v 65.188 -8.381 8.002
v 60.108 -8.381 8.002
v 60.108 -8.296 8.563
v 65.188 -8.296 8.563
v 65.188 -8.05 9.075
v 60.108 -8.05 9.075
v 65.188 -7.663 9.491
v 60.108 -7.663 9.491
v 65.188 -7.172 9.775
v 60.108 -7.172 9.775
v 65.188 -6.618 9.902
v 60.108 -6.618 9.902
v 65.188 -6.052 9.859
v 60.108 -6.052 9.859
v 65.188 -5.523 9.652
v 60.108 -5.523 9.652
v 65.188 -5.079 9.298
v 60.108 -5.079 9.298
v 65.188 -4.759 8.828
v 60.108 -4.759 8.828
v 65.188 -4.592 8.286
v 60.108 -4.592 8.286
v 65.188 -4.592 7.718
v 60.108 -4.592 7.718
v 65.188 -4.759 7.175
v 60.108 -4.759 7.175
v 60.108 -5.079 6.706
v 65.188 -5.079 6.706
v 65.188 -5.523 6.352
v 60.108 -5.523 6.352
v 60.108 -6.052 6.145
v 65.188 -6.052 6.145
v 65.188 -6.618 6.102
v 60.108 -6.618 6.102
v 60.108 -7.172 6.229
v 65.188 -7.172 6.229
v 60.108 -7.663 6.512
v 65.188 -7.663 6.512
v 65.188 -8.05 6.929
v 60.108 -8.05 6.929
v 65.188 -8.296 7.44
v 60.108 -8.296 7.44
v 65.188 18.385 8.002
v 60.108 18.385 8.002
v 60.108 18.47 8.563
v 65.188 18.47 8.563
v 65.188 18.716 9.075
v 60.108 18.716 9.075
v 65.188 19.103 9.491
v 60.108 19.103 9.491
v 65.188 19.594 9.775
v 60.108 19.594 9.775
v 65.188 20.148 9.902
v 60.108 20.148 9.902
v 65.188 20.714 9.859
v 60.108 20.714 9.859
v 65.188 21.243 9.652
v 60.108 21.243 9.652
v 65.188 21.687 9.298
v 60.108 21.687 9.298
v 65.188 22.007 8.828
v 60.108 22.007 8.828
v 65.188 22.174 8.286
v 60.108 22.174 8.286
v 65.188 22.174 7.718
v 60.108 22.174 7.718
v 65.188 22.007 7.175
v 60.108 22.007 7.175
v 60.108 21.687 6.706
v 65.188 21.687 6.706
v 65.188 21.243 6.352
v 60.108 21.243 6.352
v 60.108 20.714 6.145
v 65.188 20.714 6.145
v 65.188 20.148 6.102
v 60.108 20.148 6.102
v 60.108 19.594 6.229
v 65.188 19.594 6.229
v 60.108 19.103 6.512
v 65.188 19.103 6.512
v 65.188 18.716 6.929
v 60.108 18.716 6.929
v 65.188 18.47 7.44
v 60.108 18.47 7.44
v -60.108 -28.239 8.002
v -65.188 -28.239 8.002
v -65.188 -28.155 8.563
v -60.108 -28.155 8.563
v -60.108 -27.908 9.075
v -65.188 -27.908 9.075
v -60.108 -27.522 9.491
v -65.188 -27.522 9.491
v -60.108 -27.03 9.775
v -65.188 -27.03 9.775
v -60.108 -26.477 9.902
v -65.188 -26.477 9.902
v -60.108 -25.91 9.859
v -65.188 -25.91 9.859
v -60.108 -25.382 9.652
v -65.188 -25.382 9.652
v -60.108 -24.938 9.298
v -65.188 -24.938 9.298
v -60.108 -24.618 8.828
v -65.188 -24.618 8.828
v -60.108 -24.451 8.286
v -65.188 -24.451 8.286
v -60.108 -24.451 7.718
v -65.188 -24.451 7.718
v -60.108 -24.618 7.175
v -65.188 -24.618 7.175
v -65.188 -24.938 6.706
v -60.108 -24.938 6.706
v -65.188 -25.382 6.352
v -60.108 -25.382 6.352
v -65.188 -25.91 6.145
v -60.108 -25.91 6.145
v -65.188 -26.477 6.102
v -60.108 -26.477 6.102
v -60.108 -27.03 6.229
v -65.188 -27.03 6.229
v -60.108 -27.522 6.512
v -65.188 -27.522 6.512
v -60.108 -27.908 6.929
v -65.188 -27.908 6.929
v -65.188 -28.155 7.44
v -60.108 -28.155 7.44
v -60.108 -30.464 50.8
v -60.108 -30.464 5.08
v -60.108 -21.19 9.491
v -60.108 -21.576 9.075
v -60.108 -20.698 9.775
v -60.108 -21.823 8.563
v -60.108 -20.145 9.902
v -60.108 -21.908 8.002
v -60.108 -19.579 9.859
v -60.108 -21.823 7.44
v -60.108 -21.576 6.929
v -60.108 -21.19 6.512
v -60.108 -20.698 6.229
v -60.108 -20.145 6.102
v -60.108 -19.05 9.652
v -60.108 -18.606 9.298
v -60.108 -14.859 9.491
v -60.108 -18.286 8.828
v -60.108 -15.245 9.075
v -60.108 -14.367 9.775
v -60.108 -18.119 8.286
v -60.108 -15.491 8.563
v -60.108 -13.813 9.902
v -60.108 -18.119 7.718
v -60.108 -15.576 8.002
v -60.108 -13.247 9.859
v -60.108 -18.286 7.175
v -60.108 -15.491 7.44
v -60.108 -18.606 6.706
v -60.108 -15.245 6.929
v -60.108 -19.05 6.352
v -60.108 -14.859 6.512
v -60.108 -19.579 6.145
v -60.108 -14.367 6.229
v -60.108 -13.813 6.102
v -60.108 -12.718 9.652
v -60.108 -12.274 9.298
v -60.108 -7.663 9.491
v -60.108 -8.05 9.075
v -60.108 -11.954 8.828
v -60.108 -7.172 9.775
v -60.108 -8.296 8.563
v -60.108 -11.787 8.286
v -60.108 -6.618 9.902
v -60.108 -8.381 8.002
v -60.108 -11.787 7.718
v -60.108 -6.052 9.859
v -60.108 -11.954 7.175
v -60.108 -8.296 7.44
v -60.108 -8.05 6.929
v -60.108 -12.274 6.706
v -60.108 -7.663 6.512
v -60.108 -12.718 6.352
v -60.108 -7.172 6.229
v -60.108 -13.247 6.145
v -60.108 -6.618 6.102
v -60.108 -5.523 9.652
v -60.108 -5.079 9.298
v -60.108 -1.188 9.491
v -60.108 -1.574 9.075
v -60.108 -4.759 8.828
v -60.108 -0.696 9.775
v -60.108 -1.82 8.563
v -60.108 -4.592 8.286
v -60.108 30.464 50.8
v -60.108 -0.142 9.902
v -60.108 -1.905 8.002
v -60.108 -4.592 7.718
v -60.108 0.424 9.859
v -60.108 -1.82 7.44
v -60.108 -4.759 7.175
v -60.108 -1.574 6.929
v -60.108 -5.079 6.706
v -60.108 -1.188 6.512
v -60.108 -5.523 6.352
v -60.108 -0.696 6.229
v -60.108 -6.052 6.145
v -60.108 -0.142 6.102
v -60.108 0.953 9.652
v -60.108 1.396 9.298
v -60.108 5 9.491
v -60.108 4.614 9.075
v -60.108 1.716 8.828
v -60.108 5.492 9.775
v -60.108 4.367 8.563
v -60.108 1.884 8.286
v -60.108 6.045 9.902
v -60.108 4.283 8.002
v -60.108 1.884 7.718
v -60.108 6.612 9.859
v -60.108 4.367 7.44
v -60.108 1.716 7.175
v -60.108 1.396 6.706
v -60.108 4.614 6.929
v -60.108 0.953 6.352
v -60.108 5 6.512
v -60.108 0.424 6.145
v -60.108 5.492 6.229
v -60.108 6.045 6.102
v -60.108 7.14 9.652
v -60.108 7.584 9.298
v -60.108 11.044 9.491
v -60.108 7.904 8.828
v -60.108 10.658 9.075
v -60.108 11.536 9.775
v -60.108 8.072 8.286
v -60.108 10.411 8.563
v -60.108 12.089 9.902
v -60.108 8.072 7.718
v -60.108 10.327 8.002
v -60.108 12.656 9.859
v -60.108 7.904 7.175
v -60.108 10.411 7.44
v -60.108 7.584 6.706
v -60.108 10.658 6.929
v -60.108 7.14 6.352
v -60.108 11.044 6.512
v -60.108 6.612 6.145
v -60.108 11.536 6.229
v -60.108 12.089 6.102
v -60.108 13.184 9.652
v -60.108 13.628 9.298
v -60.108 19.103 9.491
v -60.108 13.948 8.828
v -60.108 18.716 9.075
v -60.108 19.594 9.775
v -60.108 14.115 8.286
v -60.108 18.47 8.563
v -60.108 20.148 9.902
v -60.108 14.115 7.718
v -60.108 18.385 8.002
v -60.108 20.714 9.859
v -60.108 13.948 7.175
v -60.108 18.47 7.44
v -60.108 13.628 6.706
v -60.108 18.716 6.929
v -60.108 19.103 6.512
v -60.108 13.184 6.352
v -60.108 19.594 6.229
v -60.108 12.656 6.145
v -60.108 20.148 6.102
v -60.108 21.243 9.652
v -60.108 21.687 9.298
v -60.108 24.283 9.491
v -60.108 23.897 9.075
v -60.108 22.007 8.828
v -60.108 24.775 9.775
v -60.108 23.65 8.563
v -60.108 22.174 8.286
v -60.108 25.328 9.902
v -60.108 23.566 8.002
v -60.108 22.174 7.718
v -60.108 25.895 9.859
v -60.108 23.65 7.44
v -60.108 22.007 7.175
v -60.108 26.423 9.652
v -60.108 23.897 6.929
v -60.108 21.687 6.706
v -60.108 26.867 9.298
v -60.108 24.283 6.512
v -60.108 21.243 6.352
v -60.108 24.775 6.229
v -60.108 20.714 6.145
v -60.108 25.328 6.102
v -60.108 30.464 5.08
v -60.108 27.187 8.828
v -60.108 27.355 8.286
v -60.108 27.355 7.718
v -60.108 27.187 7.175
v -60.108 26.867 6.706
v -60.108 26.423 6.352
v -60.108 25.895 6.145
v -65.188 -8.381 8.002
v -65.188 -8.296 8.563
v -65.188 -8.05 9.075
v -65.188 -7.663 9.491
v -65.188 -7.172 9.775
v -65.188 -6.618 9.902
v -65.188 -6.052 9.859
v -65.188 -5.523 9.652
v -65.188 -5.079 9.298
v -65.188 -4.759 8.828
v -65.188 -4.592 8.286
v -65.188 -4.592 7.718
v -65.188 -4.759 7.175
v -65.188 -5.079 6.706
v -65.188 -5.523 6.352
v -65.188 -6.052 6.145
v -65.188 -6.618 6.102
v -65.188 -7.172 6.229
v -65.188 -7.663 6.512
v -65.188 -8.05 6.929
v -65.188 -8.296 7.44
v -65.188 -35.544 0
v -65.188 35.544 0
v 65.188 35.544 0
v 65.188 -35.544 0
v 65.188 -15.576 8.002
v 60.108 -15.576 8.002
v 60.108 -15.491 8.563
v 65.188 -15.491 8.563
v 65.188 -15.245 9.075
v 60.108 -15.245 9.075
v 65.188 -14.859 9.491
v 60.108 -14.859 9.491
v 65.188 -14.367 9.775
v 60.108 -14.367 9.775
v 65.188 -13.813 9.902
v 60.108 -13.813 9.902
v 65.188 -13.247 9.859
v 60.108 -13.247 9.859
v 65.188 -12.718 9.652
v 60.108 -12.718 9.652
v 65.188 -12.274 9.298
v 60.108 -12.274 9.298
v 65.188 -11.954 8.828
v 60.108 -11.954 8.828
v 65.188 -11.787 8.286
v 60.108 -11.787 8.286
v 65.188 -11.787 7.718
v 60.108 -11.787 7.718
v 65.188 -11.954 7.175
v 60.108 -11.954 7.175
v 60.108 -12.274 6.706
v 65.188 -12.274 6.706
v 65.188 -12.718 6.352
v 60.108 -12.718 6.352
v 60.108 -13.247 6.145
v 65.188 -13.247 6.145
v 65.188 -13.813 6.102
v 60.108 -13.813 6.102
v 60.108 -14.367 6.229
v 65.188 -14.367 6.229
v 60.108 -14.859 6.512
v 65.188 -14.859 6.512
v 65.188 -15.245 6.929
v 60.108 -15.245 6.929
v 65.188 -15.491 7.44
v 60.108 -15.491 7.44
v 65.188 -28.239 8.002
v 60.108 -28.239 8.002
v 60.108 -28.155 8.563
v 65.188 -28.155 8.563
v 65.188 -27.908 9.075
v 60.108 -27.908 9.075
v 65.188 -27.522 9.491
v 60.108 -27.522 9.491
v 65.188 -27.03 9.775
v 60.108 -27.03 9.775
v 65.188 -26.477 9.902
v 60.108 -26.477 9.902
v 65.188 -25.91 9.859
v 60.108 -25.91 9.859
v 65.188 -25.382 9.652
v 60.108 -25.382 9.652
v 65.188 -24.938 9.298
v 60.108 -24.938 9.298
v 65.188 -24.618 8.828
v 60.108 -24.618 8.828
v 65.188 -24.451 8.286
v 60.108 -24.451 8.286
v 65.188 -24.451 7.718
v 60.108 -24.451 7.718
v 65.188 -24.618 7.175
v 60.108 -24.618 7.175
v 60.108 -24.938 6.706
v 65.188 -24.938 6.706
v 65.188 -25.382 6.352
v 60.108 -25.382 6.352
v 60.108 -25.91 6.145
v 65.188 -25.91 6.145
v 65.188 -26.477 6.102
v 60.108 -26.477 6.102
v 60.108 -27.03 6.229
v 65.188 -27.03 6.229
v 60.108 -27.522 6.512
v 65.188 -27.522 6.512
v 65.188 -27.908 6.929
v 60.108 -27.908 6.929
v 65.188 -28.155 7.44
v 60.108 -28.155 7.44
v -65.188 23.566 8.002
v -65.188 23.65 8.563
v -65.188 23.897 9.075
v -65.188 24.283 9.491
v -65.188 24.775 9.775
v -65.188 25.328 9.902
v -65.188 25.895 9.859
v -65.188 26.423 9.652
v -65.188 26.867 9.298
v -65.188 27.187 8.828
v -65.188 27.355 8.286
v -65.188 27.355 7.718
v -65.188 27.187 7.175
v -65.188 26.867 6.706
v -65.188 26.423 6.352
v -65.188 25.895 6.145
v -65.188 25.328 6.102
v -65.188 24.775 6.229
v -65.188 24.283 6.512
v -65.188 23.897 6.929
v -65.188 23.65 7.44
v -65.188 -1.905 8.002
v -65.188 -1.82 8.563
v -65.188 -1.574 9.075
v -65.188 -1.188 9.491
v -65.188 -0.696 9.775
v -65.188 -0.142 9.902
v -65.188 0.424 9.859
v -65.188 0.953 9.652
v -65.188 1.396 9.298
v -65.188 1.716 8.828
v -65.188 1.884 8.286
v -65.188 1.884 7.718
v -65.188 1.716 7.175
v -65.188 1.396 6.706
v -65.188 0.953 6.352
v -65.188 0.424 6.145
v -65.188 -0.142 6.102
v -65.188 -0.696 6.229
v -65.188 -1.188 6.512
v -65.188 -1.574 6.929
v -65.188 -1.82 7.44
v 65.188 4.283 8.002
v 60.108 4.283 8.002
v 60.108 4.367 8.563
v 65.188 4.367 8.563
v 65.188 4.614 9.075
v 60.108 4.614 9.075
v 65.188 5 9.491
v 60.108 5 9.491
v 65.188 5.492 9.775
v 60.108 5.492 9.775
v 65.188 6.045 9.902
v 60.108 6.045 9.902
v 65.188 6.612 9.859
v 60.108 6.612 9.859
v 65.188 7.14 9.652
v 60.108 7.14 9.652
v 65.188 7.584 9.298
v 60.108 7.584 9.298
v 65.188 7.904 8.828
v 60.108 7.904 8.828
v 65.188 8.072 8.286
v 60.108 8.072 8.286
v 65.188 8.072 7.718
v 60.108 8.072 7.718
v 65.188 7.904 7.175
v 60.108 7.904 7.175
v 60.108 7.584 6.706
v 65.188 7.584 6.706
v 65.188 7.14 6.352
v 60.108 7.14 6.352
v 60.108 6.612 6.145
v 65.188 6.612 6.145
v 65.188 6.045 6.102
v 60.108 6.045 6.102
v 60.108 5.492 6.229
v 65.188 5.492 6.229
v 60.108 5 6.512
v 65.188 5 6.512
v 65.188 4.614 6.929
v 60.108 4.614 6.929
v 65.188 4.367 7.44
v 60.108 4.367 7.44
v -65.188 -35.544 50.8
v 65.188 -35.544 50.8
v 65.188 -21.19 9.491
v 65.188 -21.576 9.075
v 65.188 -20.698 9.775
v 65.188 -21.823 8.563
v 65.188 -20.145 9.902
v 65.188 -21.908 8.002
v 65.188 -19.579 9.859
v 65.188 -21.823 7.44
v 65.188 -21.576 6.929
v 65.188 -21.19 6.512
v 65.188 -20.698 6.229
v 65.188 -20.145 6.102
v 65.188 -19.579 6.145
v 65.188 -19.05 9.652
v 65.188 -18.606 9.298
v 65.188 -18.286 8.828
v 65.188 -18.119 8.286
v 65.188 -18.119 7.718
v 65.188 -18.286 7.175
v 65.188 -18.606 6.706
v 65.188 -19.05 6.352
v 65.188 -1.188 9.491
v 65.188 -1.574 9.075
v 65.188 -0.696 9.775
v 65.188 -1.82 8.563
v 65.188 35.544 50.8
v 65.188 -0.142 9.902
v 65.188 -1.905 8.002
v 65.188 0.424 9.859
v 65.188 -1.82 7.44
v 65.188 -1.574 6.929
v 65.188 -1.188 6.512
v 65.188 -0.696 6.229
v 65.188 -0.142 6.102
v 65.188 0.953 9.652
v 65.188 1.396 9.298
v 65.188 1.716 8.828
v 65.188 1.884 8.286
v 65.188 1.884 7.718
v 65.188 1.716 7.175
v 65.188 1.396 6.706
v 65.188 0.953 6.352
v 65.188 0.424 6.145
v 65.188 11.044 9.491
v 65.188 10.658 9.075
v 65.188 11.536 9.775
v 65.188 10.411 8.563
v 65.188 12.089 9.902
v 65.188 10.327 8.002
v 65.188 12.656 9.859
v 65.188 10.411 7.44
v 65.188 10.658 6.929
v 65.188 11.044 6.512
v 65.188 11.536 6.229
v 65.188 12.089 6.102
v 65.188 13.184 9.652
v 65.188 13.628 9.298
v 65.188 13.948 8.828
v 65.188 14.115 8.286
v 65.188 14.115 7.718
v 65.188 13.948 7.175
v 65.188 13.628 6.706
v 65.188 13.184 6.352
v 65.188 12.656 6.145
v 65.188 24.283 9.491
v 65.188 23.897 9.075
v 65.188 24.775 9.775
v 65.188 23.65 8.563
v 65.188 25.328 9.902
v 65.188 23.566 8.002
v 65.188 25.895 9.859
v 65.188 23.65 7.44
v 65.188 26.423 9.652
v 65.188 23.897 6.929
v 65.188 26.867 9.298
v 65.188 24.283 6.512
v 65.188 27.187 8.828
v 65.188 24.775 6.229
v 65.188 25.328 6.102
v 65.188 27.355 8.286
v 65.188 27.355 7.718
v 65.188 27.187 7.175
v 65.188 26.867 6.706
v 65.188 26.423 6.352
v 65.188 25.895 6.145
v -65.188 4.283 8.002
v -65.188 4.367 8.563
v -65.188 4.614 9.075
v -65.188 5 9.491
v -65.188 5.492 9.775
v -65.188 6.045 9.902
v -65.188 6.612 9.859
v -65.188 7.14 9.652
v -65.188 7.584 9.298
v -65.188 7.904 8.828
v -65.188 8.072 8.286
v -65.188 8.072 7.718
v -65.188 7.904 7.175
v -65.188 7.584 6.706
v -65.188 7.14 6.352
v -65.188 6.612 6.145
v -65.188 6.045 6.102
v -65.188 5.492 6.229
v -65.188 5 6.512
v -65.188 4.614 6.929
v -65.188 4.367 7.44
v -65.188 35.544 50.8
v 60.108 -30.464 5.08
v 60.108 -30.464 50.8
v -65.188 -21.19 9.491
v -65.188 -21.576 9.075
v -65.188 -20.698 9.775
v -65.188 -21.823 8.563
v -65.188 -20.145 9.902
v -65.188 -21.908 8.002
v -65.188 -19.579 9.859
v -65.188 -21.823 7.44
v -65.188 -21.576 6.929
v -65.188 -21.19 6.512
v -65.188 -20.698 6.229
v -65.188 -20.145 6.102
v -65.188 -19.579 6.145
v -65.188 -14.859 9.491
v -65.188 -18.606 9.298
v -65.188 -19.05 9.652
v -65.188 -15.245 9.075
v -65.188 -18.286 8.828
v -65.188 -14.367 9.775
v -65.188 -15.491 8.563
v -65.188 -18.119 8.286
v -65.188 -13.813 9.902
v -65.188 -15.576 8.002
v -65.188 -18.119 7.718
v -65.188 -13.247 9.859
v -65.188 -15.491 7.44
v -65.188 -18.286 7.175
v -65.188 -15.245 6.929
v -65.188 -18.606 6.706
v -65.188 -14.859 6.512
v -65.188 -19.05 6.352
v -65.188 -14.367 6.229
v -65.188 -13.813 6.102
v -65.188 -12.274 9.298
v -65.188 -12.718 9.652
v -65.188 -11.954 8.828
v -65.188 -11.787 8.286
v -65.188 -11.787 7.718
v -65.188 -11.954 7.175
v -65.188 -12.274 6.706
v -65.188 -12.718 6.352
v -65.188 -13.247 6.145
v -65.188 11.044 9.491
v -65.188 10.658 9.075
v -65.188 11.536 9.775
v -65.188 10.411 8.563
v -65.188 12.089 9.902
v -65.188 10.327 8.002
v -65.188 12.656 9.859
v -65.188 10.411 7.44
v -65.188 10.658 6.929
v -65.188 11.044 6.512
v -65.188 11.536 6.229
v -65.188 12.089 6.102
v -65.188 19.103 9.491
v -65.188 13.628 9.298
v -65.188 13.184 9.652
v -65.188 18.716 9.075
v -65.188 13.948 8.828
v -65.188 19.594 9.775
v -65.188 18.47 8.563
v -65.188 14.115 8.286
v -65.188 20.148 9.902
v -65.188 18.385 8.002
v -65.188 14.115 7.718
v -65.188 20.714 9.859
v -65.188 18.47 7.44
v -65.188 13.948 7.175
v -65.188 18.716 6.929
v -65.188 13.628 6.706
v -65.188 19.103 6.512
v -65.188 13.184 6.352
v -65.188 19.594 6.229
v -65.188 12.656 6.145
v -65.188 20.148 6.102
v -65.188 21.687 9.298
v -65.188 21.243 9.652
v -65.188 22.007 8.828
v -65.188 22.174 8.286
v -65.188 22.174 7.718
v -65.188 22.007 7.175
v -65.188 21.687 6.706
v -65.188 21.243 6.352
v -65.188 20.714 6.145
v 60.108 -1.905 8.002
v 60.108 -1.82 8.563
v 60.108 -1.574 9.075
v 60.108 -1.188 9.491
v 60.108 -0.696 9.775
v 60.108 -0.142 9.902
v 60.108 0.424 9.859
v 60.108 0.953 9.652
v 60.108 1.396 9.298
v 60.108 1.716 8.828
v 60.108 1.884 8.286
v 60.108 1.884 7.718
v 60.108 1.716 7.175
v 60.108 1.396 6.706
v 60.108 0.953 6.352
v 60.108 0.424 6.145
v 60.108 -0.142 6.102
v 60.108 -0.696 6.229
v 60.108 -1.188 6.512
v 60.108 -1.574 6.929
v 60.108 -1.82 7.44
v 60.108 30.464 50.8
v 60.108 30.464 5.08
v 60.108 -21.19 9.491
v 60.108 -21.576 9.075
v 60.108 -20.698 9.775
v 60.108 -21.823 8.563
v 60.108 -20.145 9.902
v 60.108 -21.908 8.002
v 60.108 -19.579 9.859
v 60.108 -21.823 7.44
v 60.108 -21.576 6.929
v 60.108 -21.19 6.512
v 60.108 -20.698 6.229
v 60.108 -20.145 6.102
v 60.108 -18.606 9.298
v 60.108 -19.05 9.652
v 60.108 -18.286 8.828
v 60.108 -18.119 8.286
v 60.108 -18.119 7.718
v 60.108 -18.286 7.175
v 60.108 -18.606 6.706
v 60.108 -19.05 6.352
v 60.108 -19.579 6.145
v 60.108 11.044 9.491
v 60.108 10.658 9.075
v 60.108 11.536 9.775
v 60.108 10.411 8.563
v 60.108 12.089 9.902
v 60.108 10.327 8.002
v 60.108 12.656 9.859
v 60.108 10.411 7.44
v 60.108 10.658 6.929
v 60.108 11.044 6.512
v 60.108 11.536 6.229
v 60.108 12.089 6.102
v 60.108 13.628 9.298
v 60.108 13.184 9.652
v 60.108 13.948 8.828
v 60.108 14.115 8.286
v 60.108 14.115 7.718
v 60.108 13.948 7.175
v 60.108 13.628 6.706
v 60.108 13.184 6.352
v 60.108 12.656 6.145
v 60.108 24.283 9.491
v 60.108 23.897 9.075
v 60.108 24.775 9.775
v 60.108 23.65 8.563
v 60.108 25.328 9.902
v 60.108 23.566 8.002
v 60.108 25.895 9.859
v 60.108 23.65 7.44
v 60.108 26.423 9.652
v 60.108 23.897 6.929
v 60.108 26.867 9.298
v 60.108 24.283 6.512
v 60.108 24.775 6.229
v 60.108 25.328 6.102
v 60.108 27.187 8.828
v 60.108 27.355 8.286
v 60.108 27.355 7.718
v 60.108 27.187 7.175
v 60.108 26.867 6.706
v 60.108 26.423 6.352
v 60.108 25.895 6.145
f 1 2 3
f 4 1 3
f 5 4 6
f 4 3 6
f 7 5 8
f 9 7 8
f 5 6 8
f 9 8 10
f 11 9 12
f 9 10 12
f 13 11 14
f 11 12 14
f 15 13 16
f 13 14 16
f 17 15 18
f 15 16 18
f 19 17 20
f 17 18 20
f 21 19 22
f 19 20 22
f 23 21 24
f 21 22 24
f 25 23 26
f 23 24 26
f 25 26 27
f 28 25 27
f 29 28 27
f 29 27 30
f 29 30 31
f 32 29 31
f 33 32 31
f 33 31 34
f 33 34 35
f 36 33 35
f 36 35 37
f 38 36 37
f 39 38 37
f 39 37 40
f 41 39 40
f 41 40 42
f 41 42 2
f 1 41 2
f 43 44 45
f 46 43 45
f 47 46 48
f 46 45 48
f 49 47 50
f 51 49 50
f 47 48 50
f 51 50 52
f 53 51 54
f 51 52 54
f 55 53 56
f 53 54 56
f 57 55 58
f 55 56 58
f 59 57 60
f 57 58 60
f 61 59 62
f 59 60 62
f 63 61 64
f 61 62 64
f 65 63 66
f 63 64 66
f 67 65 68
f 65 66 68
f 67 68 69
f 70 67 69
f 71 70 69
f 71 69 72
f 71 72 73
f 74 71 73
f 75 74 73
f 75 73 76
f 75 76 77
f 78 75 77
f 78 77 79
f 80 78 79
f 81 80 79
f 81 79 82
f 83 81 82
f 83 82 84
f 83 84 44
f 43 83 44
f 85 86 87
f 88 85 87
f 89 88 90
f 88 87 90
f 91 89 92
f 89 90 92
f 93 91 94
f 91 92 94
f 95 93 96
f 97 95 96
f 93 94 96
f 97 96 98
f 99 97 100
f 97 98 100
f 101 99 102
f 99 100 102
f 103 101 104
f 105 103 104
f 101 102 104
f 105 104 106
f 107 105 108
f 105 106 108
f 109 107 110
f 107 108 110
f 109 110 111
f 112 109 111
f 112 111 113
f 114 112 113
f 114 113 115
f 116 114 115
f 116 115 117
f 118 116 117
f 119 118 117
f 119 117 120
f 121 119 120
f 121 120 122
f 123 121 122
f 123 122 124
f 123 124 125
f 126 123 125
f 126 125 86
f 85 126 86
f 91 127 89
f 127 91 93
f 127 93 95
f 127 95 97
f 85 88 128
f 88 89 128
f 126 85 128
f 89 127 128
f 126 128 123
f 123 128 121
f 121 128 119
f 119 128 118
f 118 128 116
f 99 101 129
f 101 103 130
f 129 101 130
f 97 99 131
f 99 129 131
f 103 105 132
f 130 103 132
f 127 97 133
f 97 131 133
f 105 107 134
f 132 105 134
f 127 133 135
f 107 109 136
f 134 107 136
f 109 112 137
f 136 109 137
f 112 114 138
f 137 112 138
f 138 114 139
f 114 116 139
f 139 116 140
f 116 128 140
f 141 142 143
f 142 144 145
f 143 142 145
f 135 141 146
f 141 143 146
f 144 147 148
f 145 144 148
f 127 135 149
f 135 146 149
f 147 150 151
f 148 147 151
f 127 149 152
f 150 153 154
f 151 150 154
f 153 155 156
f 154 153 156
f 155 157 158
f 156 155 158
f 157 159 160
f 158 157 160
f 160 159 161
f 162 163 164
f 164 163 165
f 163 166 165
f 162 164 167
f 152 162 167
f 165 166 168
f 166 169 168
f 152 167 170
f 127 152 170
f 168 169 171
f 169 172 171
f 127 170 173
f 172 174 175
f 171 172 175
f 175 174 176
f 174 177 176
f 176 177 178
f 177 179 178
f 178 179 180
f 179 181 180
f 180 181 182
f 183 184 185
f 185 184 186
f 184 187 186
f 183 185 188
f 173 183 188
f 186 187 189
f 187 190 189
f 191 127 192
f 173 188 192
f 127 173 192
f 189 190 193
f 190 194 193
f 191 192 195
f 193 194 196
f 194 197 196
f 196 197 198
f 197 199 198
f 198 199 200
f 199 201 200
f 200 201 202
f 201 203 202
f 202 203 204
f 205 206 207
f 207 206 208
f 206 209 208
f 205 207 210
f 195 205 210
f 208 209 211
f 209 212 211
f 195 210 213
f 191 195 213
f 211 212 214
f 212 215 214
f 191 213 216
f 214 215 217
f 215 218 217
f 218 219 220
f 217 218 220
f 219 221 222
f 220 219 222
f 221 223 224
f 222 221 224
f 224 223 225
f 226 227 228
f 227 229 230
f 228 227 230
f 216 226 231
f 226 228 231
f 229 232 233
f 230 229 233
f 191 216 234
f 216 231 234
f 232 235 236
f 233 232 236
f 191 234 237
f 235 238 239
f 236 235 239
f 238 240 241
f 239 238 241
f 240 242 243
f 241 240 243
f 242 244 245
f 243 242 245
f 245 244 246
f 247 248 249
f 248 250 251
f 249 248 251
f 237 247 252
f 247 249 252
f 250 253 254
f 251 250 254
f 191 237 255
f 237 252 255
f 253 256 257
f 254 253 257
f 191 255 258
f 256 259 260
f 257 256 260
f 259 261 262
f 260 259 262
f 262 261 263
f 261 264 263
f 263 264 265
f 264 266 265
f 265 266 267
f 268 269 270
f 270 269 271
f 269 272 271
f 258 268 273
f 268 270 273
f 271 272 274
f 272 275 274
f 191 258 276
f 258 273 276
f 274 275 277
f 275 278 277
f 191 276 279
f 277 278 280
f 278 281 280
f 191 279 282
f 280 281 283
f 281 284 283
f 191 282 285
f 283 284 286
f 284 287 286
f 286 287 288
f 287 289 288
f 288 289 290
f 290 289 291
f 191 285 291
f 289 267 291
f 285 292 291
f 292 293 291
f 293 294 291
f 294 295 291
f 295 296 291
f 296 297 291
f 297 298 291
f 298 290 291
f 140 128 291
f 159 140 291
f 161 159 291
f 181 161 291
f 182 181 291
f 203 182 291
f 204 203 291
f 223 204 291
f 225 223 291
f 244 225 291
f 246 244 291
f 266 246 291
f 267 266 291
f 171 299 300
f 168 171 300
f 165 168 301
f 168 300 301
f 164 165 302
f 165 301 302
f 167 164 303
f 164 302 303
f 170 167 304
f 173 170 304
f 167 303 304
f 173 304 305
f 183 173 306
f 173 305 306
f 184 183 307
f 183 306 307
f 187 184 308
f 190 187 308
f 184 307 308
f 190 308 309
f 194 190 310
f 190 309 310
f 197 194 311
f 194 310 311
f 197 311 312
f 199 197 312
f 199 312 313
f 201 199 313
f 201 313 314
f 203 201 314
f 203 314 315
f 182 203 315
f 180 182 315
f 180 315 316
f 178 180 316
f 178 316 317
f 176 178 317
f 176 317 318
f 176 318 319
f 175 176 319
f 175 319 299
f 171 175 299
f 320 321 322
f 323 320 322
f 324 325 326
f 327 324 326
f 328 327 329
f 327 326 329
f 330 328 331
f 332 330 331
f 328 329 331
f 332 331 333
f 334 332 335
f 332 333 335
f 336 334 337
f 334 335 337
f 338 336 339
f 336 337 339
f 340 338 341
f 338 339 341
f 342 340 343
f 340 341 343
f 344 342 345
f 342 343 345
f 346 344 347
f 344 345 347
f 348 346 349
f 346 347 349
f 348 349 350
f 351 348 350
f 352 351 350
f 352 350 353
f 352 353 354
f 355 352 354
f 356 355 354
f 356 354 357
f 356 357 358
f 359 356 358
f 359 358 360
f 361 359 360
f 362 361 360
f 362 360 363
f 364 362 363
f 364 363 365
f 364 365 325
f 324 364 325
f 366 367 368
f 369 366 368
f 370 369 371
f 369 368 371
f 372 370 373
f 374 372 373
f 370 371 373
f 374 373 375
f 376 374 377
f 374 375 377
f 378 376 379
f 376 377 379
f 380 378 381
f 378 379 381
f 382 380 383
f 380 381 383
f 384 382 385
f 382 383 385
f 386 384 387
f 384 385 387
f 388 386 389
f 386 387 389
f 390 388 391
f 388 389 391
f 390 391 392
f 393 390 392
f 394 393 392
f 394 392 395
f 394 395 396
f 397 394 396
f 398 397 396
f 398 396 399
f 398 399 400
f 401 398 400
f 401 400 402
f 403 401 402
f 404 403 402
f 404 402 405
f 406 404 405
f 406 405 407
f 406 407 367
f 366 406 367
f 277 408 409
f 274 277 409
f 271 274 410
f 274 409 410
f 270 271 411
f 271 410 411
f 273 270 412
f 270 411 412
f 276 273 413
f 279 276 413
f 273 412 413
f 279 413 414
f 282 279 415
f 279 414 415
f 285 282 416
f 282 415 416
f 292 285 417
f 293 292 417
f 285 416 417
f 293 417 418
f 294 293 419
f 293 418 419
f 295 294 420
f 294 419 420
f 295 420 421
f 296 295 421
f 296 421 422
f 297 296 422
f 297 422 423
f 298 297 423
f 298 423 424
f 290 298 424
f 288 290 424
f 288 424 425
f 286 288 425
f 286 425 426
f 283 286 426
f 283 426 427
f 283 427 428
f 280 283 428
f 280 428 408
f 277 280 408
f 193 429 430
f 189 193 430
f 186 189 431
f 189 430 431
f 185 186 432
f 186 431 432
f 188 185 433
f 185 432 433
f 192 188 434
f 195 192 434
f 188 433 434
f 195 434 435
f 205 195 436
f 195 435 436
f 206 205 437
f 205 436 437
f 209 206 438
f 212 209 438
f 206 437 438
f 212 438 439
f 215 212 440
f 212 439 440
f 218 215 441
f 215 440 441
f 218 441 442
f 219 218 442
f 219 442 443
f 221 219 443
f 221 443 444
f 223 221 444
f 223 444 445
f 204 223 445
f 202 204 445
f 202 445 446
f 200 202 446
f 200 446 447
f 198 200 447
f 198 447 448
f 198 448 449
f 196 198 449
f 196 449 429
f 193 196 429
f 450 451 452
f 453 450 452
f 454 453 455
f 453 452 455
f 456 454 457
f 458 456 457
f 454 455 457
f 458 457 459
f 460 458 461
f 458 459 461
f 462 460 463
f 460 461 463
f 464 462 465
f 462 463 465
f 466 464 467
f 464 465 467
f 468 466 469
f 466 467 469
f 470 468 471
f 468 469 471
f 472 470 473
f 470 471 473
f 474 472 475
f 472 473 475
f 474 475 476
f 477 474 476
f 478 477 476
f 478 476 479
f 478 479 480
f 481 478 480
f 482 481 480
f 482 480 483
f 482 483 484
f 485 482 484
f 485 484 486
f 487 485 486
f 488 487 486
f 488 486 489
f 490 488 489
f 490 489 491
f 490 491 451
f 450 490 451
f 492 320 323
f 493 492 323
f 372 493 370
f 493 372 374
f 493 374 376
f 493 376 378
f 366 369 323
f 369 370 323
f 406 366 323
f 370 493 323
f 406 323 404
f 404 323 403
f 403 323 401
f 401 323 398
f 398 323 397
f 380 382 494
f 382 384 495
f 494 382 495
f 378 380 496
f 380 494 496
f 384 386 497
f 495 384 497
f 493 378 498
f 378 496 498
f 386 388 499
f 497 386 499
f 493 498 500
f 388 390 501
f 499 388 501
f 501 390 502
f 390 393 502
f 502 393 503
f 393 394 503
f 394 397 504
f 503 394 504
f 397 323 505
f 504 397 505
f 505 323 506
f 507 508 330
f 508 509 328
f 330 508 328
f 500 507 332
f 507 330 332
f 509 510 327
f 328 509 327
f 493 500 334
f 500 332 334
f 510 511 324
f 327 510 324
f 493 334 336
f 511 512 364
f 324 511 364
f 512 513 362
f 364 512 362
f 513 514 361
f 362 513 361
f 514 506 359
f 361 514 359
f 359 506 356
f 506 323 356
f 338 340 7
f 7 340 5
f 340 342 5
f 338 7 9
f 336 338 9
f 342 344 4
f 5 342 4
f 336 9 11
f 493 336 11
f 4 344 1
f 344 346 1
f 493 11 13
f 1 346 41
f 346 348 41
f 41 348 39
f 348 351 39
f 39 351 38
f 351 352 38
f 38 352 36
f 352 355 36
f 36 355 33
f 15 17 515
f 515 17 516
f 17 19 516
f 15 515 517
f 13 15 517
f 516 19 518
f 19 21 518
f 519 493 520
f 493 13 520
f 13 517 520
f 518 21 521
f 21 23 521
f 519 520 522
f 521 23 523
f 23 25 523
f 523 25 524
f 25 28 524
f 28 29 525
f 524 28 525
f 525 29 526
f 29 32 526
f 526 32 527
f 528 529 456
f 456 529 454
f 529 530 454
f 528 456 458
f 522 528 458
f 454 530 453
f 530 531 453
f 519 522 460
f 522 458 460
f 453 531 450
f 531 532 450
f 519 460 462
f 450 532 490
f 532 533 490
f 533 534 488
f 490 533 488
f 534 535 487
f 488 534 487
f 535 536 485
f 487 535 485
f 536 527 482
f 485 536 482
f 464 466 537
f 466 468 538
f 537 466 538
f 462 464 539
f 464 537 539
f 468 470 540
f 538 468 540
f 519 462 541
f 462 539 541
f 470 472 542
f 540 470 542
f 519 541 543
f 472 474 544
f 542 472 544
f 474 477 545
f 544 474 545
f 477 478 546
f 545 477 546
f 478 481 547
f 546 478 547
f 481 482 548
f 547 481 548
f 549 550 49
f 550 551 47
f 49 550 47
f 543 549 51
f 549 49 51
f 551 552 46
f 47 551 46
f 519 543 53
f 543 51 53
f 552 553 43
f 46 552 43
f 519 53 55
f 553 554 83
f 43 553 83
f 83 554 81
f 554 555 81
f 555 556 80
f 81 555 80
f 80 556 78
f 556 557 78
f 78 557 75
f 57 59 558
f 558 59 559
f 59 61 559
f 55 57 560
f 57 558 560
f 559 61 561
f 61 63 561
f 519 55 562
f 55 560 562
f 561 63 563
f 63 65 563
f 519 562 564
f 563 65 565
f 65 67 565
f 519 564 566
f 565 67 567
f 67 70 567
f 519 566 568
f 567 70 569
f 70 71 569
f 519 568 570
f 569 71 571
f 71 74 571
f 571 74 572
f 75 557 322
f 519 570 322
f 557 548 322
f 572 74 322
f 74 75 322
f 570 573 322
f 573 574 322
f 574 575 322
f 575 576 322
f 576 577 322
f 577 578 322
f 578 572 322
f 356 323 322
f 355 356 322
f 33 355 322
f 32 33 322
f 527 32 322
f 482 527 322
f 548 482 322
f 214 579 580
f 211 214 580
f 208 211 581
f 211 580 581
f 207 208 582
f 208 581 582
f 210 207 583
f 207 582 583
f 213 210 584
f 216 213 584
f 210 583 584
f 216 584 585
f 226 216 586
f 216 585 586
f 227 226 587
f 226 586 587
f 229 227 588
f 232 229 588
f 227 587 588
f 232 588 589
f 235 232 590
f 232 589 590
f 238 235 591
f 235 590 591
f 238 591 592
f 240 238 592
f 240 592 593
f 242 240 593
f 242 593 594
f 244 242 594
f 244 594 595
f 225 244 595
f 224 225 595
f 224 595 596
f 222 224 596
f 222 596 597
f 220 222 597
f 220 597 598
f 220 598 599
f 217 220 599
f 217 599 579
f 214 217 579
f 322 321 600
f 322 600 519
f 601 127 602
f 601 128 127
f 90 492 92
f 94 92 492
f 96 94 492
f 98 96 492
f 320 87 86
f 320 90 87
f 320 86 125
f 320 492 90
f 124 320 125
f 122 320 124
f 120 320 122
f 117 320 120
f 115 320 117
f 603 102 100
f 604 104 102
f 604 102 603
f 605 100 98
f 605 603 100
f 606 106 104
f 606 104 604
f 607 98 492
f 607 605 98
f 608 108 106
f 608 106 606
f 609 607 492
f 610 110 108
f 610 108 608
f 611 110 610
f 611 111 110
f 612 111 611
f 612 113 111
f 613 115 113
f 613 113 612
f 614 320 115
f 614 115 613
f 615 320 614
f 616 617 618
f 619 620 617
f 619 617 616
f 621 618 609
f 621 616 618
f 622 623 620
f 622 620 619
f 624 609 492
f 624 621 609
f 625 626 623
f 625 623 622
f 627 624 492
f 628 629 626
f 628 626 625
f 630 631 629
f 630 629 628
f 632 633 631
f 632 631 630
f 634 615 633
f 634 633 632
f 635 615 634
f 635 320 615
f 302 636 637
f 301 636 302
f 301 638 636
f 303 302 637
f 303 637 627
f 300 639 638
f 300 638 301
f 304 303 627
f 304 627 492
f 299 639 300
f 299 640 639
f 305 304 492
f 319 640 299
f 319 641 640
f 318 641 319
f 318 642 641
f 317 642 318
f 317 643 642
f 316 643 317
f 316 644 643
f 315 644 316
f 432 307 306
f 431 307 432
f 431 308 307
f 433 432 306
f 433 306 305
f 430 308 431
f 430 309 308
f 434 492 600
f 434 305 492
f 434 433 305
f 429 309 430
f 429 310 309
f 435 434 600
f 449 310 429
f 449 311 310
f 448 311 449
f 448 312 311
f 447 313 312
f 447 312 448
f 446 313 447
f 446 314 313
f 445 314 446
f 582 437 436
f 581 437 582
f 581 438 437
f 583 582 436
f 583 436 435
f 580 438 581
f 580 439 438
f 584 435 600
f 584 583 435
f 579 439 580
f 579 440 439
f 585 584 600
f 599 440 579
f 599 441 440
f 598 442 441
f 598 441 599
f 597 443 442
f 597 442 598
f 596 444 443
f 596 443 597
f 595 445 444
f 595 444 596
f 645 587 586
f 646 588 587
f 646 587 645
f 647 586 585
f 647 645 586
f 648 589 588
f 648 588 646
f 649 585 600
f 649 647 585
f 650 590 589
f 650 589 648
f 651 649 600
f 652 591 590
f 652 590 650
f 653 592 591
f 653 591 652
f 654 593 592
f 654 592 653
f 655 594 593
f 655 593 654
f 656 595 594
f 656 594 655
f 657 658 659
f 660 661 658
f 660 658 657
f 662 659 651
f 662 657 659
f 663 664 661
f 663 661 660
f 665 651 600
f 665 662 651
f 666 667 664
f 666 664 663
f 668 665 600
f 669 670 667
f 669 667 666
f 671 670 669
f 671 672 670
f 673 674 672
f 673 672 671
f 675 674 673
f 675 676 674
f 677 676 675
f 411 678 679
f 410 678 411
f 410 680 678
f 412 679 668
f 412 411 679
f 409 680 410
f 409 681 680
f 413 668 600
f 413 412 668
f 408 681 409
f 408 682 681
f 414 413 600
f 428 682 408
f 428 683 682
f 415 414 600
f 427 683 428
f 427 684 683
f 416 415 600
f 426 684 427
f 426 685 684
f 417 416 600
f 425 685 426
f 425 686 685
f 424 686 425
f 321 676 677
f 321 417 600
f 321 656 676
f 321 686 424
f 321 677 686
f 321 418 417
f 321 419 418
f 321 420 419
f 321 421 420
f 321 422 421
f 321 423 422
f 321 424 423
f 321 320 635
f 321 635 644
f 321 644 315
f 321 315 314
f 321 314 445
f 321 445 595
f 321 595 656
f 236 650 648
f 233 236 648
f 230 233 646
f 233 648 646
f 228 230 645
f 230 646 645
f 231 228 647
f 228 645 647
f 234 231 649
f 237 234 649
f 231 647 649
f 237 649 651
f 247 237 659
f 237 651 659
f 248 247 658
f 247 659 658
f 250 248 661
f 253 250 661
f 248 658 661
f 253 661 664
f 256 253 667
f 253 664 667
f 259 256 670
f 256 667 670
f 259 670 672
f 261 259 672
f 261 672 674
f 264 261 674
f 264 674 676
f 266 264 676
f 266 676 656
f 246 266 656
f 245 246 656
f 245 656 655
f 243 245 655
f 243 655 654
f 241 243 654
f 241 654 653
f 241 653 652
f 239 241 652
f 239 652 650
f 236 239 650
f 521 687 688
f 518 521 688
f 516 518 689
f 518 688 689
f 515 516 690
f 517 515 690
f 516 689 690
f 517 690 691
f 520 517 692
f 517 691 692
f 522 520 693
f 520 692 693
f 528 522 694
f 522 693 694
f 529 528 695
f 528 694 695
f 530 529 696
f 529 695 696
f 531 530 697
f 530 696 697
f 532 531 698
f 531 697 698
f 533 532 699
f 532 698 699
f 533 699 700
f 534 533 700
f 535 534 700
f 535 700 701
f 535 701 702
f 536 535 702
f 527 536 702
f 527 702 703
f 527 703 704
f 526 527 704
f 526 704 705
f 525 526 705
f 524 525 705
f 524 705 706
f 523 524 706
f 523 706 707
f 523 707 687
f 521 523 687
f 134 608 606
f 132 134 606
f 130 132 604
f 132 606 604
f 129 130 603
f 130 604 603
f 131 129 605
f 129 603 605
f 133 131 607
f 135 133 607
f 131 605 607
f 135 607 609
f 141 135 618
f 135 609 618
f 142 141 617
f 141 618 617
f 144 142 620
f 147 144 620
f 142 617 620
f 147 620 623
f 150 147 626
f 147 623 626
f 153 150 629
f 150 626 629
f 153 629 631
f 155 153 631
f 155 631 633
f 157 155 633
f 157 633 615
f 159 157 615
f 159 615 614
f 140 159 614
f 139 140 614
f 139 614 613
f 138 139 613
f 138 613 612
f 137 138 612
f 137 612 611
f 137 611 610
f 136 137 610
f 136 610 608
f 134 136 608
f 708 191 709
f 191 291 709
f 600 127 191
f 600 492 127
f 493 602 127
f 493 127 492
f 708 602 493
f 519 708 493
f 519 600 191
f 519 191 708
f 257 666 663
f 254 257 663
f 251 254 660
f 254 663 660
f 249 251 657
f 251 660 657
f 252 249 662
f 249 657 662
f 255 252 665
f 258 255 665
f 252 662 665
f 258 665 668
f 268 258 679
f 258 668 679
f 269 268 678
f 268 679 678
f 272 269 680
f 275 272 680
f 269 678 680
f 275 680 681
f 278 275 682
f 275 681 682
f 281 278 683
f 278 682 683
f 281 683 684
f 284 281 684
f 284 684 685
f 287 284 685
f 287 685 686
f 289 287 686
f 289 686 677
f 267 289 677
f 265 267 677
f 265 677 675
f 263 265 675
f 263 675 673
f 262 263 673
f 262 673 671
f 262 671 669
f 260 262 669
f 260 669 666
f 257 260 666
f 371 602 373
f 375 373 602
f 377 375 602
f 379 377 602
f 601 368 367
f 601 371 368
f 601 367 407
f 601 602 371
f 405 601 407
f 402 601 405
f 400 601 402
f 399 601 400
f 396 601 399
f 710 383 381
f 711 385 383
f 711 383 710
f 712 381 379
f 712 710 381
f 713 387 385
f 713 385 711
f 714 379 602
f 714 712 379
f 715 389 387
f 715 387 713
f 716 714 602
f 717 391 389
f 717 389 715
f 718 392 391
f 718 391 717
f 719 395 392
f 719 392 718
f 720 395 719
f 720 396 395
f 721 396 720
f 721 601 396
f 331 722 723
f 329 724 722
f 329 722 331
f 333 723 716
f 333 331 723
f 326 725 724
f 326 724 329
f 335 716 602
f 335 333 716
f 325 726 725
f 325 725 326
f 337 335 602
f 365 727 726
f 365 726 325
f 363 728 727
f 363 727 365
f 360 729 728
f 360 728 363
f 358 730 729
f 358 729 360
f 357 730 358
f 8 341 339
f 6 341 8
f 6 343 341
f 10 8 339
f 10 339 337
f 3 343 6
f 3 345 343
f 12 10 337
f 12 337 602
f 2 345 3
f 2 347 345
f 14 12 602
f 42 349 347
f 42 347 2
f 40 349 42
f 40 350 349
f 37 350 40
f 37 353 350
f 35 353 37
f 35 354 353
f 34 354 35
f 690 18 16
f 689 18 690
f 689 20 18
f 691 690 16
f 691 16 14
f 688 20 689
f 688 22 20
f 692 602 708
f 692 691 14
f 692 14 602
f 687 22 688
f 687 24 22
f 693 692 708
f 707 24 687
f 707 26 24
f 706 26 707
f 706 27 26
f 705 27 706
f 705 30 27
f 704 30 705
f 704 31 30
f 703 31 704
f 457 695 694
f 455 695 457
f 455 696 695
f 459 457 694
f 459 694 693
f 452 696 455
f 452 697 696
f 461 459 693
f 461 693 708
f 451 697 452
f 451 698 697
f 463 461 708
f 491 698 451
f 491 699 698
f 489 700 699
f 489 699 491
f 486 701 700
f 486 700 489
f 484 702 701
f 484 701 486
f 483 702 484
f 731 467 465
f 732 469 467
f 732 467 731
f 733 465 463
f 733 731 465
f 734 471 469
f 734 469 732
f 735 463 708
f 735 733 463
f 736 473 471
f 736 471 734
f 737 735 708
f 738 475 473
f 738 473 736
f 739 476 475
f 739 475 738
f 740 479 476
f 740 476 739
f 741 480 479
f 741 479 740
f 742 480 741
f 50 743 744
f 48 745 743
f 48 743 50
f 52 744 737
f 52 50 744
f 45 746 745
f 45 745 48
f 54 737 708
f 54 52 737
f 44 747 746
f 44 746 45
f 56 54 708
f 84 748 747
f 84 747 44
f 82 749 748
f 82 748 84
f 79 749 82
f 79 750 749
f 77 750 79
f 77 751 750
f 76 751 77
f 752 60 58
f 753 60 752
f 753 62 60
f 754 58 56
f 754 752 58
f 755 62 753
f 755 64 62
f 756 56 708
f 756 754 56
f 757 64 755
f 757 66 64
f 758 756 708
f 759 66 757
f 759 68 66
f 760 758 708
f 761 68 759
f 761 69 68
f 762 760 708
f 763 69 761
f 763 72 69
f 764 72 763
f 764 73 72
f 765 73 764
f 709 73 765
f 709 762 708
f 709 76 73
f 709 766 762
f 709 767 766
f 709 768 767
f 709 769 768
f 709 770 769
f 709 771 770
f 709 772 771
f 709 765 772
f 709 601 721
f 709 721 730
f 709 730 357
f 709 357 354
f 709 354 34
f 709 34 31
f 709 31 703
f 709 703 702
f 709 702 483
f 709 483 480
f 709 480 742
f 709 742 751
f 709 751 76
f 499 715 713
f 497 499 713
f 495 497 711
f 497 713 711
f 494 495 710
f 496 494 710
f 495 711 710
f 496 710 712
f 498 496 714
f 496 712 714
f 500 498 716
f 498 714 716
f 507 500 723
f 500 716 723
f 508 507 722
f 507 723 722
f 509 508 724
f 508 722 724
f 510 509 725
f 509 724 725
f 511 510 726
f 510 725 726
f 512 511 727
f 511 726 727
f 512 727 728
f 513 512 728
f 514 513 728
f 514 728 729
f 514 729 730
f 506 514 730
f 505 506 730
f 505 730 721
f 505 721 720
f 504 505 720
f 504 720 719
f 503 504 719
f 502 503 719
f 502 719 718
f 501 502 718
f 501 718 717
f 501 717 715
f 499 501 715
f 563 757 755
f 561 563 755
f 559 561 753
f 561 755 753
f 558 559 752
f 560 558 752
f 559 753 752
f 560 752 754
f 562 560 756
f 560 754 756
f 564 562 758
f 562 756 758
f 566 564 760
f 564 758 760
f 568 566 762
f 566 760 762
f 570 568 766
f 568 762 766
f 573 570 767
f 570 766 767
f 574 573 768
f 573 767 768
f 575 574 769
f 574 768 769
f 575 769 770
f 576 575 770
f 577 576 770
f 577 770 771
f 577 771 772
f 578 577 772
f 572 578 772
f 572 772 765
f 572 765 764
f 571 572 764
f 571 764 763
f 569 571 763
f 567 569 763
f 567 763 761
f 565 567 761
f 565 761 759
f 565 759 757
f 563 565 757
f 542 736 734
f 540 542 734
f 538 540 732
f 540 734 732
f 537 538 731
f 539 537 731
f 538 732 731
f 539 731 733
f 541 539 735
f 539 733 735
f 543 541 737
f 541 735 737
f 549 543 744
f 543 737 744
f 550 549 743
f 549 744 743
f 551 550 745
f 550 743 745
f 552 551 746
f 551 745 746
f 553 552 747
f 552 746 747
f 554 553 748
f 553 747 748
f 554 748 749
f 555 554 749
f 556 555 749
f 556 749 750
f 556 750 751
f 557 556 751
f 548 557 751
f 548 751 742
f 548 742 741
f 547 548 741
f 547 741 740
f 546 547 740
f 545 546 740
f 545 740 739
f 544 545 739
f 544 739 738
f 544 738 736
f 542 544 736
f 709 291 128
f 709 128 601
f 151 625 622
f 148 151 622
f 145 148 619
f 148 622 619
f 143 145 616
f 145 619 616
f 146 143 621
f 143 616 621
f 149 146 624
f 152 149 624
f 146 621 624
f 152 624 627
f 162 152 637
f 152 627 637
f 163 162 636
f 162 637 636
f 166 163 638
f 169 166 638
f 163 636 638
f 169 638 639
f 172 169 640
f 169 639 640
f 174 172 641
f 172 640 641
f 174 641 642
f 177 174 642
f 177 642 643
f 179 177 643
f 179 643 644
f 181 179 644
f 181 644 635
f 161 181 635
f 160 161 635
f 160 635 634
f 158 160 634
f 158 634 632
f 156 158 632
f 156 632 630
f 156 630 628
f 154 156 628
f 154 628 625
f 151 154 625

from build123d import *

# Parameters (mm, degrees)
F0_W     = 130.376012
F0_H     = 71.088024
F1_DEPTH = 50.8
F2_T     = -5.08
F4_D     = 3.81


with BuildPart() as f1:
    # F0 (on Top) → F1 (new body)
    with BuildSketch(Plane.XY):
        Rectangle(F0_W, F0_H)
    extrude(amount=F1_DEPTH)

    # F2
    f2_openings = [f1.faces().sort_by_distance(p)[0] for p in [
        (0, 0, 50.8),
    ]]
    offset(amount=F2_T, openings=f2_openings)

    # F4 (through all)
    with Locations(Plane.YZ.offset(65.188006)):
        with Locations((-26.334226, 8.001857), (-20.002501, 8.001857), (-13.670773, 8.001857), (-6.475631, 8.001857), (0, 8.001857), (6.187825, 8.001857), (12.231745, 8.001857), (20.290304, 8.001857), (25.470806, 8.001857)):
            Hole(F4_D / 2)


solid = f1.part
